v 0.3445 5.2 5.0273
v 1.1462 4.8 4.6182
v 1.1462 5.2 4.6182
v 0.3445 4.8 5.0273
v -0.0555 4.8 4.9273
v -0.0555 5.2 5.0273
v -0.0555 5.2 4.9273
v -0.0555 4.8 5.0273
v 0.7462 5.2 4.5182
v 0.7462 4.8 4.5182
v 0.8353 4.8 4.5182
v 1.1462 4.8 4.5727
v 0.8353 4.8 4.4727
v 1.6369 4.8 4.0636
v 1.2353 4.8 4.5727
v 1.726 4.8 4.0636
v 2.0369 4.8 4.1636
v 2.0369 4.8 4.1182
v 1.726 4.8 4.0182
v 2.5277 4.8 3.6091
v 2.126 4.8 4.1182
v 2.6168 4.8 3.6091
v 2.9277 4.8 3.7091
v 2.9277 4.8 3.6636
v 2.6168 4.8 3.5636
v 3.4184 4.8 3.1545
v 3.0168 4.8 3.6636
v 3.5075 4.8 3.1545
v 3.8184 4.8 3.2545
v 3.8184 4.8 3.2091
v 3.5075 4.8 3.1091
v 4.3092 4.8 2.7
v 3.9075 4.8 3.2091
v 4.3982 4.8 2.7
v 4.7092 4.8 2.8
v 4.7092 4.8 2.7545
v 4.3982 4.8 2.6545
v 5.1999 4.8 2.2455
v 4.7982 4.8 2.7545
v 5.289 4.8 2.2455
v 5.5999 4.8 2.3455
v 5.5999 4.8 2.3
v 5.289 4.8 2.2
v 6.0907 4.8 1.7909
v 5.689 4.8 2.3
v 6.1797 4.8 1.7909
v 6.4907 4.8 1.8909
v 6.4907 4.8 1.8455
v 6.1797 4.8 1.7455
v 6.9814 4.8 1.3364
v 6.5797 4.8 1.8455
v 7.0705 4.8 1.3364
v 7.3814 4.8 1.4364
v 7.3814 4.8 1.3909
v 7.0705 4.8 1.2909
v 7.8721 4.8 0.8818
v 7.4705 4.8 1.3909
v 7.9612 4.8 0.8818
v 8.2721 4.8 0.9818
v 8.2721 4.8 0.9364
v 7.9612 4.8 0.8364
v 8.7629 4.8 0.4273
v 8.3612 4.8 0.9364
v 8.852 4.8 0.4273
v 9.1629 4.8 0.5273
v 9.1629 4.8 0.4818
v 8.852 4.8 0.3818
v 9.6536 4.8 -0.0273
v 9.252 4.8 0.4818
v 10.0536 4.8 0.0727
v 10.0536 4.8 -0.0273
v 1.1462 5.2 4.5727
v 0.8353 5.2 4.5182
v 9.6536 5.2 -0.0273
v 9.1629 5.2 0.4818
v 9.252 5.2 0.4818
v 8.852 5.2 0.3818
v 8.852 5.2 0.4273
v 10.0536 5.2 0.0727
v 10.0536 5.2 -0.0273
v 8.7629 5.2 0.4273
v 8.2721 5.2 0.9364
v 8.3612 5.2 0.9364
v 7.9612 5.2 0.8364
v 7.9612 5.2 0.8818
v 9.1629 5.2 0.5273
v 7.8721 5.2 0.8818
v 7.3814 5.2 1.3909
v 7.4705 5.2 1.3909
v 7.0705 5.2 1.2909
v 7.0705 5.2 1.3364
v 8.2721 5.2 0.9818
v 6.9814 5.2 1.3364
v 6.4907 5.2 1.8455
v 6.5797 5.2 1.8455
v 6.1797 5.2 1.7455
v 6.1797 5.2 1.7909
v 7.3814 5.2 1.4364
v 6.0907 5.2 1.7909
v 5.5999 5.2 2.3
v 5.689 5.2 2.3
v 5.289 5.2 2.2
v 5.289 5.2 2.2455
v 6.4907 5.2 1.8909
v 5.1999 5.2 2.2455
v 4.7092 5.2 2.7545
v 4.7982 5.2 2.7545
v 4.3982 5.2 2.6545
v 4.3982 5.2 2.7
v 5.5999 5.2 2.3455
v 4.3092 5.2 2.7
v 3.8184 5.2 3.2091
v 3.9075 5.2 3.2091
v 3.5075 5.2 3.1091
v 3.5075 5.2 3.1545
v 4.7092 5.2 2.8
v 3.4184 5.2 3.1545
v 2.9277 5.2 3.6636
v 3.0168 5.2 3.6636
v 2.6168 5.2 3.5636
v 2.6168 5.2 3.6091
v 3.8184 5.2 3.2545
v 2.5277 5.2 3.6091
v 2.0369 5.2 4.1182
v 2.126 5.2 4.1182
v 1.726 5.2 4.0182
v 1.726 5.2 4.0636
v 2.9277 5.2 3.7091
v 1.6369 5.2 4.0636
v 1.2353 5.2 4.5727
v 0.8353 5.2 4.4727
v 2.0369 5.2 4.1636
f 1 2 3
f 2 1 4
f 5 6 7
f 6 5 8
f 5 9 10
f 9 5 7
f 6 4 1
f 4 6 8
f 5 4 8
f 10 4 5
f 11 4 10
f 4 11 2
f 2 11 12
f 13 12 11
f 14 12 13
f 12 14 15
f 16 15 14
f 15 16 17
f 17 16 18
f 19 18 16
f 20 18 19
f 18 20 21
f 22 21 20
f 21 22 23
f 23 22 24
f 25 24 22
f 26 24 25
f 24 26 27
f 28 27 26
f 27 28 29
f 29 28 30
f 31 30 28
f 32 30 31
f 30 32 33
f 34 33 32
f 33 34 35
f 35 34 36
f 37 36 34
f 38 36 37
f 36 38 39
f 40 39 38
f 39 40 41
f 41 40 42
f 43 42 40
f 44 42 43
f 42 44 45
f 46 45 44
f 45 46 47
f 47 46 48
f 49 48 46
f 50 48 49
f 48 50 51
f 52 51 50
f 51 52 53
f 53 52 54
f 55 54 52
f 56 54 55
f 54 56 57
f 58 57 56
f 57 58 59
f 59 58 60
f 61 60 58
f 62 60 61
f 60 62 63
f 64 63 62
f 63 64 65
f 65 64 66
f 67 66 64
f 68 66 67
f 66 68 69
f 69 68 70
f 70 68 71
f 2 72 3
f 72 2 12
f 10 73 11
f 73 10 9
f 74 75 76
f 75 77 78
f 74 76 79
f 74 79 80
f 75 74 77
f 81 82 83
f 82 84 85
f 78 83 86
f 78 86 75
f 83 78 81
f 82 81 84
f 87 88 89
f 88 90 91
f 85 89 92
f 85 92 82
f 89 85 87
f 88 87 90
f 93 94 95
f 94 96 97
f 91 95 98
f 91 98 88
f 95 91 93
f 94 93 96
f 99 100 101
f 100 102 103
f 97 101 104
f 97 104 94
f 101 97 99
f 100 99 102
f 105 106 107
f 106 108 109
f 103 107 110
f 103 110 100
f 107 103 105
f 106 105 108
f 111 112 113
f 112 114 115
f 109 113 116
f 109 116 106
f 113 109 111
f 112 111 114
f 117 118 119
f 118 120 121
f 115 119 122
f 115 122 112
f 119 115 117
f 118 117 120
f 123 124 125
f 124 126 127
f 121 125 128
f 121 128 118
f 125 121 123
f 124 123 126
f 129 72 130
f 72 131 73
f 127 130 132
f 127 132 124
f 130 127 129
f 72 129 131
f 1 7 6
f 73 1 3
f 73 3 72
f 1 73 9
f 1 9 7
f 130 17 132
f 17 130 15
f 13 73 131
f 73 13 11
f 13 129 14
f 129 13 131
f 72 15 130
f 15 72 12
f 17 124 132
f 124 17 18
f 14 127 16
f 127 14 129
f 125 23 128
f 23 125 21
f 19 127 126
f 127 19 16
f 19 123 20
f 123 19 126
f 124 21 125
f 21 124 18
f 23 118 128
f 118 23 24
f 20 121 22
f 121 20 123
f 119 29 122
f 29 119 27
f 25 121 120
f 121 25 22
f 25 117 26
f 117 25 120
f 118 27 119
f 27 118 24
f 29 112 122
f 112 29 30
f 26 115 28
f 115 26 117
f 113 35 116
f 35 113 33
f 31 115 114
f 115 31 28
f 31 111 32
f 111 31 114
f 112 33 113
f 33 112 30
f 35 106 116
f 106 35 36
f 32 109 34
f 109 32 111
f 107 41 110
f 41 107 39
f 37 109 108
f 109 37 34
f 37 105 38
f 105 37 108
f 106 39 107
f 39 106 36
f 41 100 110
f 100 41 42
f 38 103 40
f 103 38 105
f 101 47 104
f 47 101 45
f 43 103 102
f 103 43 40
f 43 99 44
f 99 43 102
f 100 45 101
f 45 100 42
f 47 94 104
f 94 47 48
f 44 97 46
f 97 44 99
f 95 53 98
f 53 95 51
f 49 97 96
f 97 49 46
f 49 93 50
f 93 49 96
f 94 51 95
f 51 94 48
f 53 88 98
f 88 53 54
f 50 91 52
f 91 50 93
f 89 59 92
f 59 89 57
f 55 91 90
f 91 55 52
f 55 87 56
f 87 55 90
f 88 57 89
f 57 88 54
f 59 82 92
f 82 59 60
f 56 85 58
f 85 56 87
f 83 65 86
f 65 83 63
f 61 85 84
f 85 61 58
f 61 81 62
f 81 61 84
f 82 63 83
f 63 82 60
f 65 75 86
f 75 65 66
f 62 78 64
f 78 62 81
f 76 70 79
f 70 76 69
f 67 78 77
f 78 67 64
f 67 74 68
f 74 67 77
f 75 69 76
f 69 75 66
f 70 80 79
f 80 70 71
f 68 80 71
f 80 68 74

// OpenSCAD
hull() {
    translate([0.14453710000000003, 5.0, 4.9772727272727275]) cube([0.4, 0.4, 0.1], center=true);
    translate([0.9462049, 5.0, 4.568181818181819]) cube([0.4, 0.4, 0.1], center=true);
}


hull() {
    translate([1.0352791, 5.0, 4.522727272727273]) cube([0.4, 0.4, 0.1], center=true);
    translate([1.8369469, 5.0, 4.113636363636363]) cube([0.4, 0.4, 0.1], center=true);
}


hull() {
    translate([1.9260211, 5.0, 4.068181818181818]) cube([0.4, 0.4, 0.1], center=true);
    translate([2.7276889, 5.0, 3.6590909090909087]) cube([0.4, 0.4, 0.1], center=true);
}


hull() {
    translate([2.8167630999999997, 5.0, 3.6136363636363633]) cube([0.4, 0.4, 0.1], center=true);
    translate([3.6184309, 5.0, 3.2045454545454546]) cube([0.4, 0.4, 0.1], center=true);
}


hull() {
    translate([3.7075051, 5.0, 3.159090909090909]) cube([0.4, 0.4, 0.1], center=true);
    translate([4.5091729, 5.0, 2.75]) cube([0.4, 0.4, 0.1], center=true);
}


hull() {
    translate([4.5982471, 5.0, 2.7045454545454546]) cube([0.4, 0.4, 0.1], center=true);
    translate([5.3999149, 5.0, 2.2954545454545454]) cube([0.4, 0.4, 0.1], center=true);
}


hull() {
    translate([5.4889890999999995, 5.0, 2.25]) cube([0.4, 0.4, 0.1], center=true);
    translate([6.2906569, 5.0, 1.8409090909090908]) cube([0.4, 0.4, 0.1], center=true);
}


hull() {
    translate([6.379731100000001, 5.0, 1.7954545454545454]) cube([0.4, 0.4, 0.1], center=true);
    translate([7.1813989000000005, 5.0, 1.3863636363636367]) cube([0.4, 0.4, 0.1], center=true);
}


hull() {
    translate([7.2704731, 5.0, 1.3409090909090913]) cube([0.4, 0.4, 0.1], center=true);
    translate([8.0721409, 5.0, 0.9318181818181818]) cube([0.4, 0.4, 0.1], center=true);
}


hull() {
    translate([8.161215100000001, 5.0, 0.8863636363636364]) cube([0.4, 0.4, 0.1], center=true);
    translate([8.9628829, 5.0, 0.4772727272727273]) cube([0.4, 0.4, 0.1], center=true);
}


hull() {
    translate([9.051957100000001, 5.0, 0.4318181818181818]) cube([0.4, 0.4, 0.1], center=true);
    translate([9.8536249, 5.0, 0.02272727272727273]) cube([0.4, 0.4, 0.1], center=true);
}
